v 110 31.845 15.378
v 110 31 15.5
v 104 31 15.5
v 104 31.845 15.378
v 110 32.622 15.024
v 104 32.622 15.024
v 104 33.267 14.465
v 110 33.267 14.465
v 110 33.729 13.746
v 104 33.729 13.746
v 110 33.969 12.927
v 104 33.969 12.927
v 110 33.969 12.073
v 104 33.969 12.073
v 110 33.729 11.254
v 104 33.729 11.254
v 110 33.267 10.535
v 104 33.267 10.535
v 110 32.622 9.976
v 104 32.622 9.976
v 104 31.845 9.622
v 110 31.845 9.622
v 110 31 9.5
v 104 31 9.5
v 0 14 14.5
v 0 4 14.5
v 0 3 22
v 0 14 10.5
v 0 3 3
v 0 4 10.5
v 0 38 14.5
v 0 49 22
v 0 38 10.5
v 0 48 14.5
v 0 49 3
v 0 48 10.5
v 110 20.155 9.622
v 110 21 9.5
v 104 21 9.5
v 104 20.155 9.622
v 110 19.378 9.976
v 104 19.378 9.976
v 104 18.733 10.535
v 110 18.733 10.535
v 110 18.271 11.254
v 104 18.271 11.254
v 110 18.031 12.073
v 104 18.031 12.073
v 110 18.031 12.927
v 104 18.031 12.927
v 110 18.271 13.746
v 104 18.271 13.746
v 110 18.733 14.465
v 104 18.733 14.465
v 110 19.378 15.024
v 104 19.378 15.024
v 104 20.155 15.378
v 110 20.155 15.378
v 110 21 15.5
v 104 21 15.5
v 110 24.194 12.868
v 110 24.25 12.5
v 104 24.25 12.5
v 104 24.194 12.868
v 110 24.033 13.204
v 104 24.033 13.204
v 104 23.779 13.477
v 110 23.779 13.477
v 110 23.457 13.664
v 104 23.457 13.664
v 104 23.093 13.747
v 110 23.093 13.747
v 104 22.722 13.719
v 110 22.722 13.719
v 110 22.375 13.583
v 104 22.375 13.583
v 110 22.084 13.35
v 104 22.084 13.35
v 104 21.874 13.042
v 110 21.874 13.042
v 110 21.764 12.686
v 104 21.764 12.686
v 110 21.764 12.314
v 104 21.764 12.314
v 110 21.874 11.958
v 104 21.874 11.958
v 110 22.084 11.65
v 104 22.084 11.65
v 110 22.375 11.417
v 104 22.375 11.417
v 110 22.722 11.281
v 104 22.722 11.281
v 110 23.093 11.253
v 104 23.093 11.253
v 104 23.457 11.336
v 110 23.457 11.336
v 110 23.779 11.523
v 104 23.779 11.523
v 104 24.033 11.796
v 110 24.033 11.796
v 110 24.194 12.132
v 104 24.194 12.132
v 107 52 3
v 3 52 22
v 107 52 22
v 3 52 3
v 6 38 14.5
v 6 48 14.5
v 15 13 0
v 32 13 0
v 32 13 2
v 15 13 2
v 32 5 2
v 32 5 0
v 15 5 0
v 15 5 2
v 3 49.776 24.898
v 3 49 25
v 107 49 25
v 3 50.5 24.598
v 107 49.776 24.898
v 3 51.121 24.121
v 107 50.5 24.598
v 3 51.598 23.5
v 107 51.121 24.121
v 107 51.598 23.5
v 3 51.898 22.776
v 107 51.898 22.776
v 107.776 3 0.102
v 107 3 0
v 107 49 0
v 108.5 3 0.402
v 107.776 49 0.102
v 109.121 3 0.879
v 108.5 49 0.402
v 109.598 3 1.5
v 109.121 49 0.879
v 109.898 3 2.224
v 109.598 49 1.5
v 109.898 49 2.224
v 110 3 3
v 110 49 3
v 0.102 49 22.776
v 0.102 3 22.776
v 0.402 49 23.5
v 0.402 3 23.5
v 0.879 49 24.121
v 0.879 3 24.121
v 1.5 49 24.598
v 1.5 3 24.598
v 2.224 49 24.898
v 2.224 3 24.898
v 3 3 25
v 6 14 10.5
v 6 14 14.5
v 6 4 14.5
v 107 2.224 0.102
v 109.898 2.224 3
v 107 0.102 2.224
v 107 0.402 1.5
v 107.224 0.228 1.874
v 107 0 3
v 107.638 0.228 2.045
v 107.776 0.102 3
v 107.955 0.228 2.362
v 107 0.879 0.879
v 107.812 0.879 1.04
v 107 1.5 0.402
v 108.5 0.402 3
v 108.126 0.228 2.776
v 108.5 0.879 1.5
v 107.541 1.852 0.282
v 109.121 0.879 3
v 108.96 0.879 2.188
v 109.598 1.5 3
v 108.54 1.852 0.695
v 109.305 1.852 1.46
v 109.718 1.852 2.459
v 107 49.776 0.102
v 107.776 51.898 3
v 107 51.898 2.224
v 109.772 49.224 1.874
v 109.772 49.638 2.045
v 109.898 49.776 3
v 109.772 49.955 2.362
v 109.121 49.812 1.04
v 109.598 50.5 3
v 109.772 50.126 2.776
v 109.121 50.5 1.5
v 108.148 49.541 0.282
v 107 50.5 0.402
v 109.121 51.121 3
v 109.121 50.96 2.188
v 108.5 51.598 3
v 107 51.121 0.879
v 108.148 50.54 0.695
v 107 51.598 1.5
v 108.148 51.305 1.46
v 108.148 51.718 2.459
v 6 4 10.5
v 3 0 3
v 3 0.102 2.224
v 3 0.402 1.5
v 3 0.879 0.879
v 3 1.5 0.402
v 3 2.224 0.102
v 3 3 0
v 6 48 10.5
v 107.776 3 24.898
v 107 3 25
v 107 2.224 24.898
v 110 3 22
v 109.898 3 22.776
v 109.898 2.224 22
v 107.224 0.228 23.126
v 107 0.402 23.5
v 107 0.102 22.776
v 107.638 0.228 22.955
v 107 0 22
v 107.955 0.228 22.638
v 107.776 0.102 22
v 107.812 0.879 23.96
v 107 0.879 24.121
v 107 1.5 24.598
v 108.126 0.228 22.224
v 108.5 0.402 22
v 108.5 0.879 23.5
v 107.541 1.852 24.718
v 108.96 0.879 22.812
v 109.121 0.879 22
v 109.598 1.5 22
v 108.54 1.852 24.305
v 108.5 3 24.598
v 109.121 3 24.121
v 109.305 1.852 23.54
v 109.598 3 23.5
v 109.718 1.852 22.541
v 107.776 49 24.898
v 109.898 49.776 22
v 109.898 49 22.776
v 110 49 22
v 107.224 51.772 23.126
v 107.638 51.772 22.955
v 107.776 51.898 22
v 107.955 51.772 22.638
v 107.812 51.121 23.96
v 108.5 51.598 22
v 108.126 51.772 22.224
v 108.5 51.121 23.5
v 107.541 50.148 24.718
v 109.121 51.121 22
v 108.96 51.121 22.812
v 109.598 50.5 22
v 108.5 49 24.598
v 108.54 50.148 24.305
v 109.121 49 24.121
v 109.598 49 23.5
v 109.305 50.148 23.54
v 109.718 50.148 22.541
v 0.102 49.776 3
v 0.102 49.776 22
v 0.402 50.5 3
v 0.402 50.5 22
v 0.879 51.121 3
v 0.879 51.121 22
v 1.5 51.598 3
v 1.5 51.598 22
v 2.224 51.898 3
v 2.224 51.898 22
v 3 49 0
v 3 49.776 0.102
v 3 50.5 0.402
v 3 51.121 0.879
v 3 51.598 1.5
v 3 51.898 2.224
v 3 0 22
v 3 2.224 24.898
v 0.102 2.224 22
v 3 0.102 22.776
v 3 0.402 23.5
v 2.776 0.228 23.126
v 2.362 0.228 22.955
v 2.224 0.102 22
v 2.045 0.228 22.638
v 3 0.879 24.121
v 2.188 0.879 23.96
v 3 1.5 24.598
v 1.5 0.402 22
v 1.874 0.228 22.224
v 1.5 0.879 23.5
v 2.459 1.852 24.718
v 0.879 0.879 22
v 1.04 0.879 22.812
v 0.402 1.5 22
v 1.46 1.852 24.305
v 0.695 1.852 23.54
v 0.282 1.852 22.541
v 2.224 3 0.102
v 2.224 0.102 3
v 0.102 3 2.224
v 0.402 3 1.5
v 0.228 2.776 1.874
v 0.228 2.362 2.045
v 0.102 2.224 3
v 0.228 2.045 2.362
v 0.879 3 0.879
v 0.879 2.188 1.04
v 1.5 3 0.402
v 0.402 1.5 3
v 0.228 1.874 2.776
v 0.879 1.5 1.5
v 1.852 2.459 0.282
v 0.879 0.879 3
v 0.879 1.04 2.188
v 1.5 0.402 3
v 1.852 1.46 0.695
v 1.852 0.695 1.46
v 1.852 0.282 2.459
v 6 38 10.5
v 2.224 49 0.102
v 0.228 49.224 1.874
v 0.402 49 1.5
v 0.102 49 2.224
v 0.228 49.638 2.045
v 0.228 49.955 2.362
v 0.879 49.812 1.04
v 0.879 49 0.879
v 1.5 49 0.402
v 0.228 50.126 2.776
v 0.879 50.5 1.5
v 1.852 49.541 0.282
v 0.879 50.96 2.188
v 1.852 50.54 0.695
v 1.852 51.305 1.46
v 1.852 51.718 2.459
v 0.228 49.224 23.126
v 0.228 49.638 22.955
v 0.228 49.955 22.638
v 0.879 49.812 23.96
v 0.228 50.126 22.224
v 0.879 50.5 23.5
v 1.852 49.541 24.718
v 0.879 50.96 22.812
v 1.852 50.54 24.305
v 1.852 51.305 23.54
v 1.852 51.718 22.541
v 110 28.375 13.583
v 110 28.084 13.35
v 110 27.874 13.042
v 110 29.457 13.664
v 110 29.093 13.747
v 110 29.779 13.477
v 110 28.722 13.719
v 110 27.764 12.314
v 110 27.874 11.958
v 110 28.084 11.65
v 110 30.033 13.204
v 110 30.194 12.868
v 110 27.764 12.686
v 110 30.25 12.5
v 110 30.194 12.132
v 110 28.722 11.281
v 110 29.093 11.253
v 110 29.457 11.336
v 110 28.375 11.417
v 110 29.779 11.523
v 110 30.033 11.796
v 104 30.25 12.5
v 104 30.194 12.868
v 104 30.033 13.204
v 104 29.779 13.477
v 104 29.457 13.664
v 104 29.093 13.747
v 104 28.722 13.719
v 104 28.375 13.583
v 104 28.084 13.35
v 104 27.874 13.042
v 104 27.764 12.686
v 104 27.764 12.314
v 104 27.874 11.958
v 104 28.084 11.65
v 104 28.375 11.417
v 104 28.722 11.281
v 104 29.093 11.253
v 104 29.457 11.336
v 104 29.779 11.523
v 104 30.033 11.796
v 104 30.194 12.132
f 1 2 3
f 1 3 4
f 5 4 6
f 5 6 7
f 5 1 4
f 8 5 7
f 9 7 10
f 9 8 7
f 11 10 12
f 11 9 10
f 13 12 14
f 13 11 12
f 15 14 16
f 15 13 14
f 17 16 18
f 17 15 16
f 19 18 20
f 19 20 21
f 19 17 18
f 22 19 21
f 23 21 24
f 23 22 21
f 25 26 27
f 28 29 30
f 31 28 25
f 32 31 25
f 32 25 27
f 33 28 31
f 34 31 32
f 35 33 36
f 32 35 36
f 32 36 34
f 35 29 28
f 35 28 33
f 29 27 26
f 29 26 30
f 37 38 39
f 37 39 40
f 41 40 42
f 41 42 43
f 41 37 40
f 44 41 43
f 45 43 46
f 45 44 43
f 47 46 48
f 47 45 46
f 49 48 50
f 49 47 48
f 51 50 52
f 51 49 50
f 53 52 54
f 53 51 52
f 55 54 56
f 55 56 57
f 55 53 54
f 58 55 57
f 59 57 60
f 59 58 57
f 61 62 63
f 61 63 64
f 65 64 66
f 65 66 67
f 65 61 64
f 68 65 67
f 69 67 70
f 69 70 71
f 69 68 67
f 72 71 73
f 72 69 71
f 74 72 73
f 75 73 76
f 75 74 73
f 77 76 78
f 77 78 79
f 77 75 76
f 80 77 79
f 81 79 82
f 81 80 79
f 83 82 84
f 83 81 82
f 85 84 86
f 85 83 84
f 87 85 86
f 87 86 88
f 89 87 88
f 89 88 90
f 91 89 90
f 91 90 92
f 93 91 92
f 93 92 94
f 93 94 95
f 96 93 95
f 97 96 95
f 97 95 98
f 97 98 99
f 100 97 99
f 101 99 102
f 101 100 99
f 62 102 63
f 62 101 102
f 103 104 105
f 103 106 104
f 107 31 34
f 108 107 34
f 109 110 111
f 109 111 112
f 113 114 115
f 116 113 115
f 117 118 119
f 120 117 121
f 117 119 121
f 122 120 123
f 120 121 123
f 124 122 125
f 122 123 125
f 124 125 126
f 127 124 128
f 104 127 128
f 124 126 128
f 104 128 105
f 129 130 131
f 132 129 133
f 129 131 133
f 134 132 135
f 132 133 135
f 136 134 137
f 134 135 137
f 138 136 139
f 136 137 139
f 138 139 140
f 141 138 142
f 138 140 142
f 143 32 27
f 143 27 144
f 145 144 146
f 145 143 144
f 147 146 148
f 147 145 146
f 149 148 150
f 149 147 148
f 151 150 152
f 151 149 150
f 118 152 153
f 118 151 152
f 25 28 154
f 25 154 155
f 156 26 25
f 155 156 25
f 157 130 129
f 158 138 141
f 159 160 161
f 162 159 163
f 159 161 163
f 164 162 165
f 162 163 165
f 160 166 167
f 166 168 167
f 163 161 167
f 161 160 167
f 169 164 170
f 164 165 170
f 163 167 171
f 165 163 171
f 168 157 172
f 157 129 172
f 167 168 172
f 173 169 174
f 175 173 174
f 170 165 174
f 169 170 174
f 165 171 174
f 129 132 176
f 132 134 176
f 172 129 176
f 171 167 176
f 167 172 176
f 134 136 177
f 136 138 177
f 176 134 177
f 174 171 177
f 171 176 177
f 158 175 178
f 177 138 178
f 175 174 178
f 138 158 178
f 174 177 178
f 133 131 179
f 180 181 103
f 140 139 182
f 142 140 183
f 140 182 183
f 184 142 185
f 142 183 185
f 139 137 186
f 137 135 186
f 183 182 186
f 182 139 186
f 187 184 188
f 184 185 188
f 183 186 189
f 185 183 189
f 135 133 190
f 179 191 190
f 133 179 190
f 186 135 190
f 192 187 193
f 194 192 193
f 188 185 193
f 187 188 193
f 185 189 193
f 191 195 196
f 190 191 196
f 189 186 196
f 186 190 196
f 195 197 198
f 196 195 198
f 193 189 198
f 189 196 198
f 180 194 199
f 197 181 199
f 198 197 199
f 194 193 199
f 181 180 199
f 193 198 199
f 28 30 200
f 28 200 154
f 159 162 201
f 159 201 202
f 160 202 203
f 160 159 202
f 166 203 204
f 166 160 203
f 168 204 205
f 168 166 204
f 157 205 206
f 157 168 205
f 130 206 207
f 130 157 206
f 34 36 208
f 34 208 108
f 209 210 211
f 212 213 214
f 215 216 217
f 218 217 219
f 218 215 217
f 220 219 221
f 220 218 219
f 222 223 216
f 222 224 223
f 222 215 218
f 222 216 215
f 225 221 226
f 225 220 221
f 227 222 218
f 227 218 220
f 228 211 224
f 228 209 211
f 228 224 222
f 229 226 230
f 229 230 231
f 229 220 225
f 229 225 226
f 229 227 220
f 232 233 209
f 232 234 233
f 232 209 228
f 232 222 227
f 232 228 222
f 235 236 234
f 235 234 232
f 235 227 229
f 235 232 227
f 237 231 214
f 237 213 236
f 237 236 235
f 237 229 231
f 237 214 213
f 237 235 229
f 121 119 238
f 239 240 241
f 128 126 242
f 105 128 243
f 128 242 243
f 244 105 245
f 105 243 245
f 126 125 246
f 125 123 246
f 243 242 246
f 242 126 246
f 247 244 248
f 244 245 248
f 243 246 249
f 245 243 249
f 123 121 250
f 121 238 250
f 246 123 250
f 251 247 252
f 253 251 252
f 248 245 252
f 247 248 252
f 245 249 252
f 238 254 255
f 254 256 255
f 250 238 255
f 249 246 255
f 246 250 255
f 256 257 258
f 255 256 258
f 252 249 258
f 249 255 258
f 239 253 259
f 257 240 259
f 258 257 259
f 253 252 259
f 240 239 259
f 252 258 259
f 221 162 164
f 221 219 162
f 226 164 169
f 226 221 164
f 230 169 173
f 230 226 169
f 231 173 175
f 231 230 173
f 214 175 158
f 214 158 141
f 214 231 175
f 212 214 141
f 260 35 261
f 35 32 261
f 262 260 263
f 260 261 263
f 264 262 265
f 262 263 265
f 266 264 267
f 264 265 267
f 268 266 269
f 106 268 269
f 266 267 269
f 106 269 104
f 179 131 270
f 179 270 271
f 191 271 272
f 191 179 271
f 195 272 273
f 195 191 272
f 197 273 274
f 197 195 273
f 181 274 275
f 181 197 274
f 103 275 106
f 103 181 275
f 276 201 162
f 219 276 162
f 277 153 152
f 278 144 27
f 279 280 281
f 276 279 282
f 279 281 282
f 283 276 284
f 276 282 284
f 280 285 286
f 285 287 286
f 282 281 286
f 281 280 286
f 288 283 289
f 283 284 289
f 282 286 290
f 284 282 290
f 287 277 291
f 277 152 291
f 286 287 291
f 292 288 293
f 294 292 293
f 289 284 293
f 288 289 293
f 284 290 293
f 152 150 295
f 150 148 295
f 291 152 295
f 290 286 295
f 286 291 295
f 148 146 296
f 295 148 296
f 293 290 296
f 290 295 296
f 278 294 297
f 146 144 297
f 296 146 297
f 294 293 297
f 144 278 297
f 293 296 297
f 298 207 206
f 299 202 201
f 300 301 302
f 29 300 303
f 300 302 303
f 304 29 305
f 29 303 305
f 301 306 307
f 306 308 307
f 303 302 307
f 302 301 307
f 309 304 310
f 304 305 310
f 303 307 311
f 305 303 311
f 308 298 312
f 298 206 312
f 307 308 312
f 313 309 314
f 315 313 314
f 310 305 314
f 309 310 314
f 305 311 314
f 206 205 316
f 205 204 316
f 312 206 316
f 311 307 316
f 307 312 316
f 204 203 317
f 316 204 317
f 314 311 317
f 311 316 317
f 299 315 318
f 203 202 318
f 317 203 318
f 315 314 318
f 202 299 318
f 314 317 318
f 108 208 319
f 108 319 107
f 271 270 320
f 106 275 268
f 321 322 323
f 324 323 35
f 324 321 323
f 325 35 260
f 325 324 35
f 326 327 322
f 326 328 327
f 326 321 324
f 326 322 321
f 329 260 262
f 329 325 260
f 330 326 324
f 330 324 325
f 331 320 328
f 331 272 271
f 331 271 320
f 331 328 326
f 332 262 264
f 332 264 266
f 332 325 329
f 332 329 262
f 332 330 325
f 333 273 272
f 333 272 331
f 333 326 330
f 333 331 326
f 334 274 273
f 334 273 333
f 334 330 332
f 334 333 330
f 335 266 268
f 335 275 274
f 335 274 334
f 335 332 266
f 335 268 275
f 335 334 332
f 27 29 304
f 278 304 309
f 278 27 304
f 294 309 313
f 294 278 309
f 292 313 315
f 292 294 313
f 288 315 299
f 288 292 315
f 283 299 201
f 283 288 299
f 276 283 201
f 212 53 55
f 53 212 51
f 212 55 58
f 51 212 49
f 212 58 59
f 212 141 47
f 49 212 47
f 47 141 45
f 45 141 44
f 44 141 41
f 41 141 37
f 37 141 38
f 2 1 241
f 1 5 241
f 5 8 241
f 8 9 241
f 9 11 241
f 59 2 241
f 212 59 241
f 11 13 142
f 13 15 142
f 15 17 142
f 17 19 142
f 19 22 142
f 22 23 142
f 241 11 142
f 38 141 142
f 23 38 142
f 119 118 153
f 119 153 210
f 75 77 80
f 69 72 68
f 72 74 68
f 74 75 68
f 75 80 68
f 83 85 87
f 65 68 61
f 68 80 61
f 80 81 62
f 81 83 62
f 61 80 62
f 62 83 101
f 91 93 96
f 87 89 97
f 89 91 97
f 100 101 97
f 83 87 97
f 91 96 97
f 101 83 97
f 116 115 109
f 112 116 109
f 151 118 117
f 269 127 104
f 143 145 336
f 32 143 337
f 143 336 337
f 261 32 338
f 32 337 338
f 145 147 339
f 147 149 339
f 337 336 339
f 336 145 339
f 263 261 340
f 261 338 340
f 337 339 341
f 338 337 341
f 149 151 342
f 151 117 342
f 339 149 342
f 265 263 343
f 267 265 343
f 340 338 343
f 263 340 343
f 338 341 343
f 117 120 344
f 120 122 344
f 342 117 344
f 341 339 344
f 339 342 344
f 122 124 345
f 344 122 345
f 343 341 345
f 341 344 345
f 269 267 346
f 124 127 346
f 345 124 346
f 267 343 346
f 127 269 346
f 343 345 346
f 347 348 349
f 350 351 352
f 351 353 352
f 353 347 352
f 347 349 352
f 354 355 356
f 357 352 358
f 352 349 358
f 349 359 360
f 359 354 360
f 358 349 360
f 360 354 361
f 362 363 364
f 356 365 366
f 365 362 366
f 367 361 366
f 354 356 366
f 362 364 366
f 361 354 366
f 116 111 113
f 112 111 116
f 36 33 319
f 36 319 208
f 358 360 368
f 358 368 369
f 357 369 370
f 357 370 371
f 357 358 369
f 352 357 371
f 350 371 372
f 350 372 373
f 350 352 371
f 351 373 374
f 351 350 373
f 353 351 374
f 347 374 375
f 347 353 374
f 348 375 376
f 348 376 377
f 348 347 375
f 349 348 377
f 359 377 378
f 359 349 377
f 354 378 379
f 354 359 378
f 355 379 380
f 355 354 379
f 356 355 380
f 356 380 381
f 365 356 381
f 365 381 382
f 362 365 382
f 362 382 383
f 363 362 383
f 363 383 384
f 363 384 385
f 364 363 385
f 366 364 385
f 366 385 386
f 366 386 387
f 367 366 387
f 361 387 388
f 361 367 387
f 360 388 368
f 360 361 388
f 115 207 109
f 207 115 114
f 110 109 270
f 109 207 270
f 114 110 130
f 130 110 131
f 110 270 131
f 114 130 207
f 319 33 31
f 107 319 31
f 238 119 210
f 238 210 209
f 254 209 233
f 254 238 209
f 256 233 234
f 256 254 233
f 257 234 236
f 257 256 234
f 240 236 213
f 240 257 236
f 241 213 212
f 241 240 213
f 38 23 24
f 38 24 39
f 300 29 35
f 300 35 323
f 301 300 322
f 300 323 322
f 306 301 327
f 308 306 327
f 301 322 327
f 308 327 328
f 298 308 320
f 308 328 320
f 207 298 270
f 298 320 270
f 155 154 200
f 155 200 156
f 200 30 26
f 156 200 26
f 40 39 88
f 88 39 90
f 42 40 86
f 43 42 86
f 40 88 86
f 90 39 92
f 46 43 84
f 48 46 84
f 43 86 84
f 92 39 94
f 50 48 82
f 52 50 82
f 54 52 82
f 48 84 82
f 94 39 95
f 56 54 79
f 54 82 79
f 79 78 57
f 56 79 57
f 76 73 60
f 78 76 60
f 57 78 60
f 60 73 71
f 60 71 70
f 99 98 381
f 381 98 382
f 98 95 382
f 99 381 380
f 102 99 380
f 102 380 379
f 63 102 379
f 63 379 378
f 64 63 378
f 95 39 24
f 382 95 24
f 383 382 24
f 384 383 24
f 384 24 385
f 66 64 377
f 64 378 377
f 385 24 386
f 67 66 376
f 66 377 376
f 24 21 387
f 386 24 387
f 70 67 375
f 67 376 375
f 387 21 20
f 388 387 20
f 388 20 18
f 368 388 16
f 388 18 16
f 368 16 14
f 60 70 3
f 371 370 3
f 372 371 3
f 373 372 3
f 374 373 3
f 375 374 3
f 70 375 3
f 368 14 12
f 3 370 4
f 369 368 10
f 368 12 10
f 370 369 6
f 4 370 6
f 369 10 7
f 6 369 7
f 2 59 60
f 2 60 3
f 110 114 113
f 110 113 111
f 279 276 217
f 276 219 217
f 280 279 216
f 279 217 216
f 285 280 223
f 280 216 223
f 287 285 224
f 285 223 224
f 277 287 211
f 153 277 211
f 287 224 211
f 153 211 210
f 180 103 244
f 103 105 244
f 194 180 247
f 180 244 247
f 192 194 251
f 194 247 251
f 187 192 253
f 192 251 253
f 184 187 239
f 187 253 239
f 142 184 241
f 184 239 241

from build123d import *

# Parameters (mm, degrees)
SKETCH_1_W          = 110
SKETCH_1_H          = 52
EXTRUDE_1_DEPTH     = 25
SKETCH_2_R          = 1.25
CUT_EXTRUDE_1_DEPTH = 6
SKETCH_3_W          = 4
SKETCH_3_H          = 10
CUT_EXTRUDE_2_DEPTH = 6
SKETCH_4_W          = 4
SKETCH_4_H          = 10
CUT_EXTRUDE_3_DEPTH = 6
SKETCH_5_W          = 17
SKETCH_5_H          = 8
CUT_EXTRUDE_4_DEPTH = 2
FILLET_1_R          = 3


with BuildPart() as part:
    # Эскиз1 → Бобышка-Вытянуть1 (new body)
    with BuildSketch(Plane.XY):
        with Locations((55, 26)):
            Rectangle(SKETCH_1_W, SKETCH_1_H)
    extrude(amount=EXTRUDE_1_DEPTH)

    # Эскиз2 → Вырез-Вытянуть1 (cut)
    with BuildSketch(Plane(origin=(110, 0, 0), x_dir=(0, 0, -1), z_dir=(1, 0, 0))):
        with BuildLine():
            Line((-9.5, 31), (-9.5, 21))
            ThreePointArc((-9.5, 21), (-12.5, 18), (-15.5, 21))
            Line((-15.5, 21), (-15.5, 31))
            ThreePointArc((-15.5, 31), (-12.5, 34), (-9.5, 31))
        make_face()
        with Locations(Location((-12.5, 29, 0), (0, 0, 90))):
            Circle(SKETCH_2_R, mode=Mode.SUBTRACT)
        with Locations(Location((-12.5, 23, 0), (0, 0, 90))):
            Circle(SKETCH_2_R, mode=Mode.SUBTRACT)
    extrude(amount=-CUT_EXTRUDE_1_DEPTH, mode=Mode.SUBTRACT)

    # Эскиз3 → Вырез-Вытянуть2 (cut)
    with BuildSketch(Plane.ZY):
        with Locations((12.5, 9)):
            Rectangle(SKETCH_3_W, SKETCH_3_H)
    extrude(amount=-CUT_EXTRUDE_2_DEPTH, mode=Mode.SUBTRACT)

    # Эскиз4 → Вырез-Вытянуть3 (cut)
    with BuildSketch(Plane.ZY):
        with Locations((12.5, 43)):
            Rectangle(SKETCH_4_W, SKETCH_4_H)
    extrude(amount=-CUT_EXTRUDE_3_DEPTH, mode=Mode.SUBTRACT)

    # Эскиз5 → Вырез-Вытянуть4 (cut)
    with BuildSketch(Plane(origin=(0, 0, 0), x_dir=(-1, 0, 0), z_dir=(0, 0, -1))):
        with Locations((-23.5, 9)):
            Rectangle(SKETCH_5_W, SKETCH_5_H)
    extrude(amount=-CUT_EXTRUDE_4_DEPTH, mode=Mode.SUBTRACT)

    # Скругление1
    fillet_1_edges = [part.edges().sort_by_distance(p)[0] for p in [
        (110, 26, 25),
        (55, 52, 25),
        (0, 26, 25),
        (55, 52, 0),
        (110, 26, 0),
        (55, 0, 0),
        (0, 26, 0),
        (55, 0, 25),
        (0, 52, 12.5),
        (110, 52, 12.5),
        (110, 0, 12.5),
        (0, 0, 12.5),
    ]]
    fillet(fillet_1_edges, radius=FILLET_1_R)


solid = part.part
